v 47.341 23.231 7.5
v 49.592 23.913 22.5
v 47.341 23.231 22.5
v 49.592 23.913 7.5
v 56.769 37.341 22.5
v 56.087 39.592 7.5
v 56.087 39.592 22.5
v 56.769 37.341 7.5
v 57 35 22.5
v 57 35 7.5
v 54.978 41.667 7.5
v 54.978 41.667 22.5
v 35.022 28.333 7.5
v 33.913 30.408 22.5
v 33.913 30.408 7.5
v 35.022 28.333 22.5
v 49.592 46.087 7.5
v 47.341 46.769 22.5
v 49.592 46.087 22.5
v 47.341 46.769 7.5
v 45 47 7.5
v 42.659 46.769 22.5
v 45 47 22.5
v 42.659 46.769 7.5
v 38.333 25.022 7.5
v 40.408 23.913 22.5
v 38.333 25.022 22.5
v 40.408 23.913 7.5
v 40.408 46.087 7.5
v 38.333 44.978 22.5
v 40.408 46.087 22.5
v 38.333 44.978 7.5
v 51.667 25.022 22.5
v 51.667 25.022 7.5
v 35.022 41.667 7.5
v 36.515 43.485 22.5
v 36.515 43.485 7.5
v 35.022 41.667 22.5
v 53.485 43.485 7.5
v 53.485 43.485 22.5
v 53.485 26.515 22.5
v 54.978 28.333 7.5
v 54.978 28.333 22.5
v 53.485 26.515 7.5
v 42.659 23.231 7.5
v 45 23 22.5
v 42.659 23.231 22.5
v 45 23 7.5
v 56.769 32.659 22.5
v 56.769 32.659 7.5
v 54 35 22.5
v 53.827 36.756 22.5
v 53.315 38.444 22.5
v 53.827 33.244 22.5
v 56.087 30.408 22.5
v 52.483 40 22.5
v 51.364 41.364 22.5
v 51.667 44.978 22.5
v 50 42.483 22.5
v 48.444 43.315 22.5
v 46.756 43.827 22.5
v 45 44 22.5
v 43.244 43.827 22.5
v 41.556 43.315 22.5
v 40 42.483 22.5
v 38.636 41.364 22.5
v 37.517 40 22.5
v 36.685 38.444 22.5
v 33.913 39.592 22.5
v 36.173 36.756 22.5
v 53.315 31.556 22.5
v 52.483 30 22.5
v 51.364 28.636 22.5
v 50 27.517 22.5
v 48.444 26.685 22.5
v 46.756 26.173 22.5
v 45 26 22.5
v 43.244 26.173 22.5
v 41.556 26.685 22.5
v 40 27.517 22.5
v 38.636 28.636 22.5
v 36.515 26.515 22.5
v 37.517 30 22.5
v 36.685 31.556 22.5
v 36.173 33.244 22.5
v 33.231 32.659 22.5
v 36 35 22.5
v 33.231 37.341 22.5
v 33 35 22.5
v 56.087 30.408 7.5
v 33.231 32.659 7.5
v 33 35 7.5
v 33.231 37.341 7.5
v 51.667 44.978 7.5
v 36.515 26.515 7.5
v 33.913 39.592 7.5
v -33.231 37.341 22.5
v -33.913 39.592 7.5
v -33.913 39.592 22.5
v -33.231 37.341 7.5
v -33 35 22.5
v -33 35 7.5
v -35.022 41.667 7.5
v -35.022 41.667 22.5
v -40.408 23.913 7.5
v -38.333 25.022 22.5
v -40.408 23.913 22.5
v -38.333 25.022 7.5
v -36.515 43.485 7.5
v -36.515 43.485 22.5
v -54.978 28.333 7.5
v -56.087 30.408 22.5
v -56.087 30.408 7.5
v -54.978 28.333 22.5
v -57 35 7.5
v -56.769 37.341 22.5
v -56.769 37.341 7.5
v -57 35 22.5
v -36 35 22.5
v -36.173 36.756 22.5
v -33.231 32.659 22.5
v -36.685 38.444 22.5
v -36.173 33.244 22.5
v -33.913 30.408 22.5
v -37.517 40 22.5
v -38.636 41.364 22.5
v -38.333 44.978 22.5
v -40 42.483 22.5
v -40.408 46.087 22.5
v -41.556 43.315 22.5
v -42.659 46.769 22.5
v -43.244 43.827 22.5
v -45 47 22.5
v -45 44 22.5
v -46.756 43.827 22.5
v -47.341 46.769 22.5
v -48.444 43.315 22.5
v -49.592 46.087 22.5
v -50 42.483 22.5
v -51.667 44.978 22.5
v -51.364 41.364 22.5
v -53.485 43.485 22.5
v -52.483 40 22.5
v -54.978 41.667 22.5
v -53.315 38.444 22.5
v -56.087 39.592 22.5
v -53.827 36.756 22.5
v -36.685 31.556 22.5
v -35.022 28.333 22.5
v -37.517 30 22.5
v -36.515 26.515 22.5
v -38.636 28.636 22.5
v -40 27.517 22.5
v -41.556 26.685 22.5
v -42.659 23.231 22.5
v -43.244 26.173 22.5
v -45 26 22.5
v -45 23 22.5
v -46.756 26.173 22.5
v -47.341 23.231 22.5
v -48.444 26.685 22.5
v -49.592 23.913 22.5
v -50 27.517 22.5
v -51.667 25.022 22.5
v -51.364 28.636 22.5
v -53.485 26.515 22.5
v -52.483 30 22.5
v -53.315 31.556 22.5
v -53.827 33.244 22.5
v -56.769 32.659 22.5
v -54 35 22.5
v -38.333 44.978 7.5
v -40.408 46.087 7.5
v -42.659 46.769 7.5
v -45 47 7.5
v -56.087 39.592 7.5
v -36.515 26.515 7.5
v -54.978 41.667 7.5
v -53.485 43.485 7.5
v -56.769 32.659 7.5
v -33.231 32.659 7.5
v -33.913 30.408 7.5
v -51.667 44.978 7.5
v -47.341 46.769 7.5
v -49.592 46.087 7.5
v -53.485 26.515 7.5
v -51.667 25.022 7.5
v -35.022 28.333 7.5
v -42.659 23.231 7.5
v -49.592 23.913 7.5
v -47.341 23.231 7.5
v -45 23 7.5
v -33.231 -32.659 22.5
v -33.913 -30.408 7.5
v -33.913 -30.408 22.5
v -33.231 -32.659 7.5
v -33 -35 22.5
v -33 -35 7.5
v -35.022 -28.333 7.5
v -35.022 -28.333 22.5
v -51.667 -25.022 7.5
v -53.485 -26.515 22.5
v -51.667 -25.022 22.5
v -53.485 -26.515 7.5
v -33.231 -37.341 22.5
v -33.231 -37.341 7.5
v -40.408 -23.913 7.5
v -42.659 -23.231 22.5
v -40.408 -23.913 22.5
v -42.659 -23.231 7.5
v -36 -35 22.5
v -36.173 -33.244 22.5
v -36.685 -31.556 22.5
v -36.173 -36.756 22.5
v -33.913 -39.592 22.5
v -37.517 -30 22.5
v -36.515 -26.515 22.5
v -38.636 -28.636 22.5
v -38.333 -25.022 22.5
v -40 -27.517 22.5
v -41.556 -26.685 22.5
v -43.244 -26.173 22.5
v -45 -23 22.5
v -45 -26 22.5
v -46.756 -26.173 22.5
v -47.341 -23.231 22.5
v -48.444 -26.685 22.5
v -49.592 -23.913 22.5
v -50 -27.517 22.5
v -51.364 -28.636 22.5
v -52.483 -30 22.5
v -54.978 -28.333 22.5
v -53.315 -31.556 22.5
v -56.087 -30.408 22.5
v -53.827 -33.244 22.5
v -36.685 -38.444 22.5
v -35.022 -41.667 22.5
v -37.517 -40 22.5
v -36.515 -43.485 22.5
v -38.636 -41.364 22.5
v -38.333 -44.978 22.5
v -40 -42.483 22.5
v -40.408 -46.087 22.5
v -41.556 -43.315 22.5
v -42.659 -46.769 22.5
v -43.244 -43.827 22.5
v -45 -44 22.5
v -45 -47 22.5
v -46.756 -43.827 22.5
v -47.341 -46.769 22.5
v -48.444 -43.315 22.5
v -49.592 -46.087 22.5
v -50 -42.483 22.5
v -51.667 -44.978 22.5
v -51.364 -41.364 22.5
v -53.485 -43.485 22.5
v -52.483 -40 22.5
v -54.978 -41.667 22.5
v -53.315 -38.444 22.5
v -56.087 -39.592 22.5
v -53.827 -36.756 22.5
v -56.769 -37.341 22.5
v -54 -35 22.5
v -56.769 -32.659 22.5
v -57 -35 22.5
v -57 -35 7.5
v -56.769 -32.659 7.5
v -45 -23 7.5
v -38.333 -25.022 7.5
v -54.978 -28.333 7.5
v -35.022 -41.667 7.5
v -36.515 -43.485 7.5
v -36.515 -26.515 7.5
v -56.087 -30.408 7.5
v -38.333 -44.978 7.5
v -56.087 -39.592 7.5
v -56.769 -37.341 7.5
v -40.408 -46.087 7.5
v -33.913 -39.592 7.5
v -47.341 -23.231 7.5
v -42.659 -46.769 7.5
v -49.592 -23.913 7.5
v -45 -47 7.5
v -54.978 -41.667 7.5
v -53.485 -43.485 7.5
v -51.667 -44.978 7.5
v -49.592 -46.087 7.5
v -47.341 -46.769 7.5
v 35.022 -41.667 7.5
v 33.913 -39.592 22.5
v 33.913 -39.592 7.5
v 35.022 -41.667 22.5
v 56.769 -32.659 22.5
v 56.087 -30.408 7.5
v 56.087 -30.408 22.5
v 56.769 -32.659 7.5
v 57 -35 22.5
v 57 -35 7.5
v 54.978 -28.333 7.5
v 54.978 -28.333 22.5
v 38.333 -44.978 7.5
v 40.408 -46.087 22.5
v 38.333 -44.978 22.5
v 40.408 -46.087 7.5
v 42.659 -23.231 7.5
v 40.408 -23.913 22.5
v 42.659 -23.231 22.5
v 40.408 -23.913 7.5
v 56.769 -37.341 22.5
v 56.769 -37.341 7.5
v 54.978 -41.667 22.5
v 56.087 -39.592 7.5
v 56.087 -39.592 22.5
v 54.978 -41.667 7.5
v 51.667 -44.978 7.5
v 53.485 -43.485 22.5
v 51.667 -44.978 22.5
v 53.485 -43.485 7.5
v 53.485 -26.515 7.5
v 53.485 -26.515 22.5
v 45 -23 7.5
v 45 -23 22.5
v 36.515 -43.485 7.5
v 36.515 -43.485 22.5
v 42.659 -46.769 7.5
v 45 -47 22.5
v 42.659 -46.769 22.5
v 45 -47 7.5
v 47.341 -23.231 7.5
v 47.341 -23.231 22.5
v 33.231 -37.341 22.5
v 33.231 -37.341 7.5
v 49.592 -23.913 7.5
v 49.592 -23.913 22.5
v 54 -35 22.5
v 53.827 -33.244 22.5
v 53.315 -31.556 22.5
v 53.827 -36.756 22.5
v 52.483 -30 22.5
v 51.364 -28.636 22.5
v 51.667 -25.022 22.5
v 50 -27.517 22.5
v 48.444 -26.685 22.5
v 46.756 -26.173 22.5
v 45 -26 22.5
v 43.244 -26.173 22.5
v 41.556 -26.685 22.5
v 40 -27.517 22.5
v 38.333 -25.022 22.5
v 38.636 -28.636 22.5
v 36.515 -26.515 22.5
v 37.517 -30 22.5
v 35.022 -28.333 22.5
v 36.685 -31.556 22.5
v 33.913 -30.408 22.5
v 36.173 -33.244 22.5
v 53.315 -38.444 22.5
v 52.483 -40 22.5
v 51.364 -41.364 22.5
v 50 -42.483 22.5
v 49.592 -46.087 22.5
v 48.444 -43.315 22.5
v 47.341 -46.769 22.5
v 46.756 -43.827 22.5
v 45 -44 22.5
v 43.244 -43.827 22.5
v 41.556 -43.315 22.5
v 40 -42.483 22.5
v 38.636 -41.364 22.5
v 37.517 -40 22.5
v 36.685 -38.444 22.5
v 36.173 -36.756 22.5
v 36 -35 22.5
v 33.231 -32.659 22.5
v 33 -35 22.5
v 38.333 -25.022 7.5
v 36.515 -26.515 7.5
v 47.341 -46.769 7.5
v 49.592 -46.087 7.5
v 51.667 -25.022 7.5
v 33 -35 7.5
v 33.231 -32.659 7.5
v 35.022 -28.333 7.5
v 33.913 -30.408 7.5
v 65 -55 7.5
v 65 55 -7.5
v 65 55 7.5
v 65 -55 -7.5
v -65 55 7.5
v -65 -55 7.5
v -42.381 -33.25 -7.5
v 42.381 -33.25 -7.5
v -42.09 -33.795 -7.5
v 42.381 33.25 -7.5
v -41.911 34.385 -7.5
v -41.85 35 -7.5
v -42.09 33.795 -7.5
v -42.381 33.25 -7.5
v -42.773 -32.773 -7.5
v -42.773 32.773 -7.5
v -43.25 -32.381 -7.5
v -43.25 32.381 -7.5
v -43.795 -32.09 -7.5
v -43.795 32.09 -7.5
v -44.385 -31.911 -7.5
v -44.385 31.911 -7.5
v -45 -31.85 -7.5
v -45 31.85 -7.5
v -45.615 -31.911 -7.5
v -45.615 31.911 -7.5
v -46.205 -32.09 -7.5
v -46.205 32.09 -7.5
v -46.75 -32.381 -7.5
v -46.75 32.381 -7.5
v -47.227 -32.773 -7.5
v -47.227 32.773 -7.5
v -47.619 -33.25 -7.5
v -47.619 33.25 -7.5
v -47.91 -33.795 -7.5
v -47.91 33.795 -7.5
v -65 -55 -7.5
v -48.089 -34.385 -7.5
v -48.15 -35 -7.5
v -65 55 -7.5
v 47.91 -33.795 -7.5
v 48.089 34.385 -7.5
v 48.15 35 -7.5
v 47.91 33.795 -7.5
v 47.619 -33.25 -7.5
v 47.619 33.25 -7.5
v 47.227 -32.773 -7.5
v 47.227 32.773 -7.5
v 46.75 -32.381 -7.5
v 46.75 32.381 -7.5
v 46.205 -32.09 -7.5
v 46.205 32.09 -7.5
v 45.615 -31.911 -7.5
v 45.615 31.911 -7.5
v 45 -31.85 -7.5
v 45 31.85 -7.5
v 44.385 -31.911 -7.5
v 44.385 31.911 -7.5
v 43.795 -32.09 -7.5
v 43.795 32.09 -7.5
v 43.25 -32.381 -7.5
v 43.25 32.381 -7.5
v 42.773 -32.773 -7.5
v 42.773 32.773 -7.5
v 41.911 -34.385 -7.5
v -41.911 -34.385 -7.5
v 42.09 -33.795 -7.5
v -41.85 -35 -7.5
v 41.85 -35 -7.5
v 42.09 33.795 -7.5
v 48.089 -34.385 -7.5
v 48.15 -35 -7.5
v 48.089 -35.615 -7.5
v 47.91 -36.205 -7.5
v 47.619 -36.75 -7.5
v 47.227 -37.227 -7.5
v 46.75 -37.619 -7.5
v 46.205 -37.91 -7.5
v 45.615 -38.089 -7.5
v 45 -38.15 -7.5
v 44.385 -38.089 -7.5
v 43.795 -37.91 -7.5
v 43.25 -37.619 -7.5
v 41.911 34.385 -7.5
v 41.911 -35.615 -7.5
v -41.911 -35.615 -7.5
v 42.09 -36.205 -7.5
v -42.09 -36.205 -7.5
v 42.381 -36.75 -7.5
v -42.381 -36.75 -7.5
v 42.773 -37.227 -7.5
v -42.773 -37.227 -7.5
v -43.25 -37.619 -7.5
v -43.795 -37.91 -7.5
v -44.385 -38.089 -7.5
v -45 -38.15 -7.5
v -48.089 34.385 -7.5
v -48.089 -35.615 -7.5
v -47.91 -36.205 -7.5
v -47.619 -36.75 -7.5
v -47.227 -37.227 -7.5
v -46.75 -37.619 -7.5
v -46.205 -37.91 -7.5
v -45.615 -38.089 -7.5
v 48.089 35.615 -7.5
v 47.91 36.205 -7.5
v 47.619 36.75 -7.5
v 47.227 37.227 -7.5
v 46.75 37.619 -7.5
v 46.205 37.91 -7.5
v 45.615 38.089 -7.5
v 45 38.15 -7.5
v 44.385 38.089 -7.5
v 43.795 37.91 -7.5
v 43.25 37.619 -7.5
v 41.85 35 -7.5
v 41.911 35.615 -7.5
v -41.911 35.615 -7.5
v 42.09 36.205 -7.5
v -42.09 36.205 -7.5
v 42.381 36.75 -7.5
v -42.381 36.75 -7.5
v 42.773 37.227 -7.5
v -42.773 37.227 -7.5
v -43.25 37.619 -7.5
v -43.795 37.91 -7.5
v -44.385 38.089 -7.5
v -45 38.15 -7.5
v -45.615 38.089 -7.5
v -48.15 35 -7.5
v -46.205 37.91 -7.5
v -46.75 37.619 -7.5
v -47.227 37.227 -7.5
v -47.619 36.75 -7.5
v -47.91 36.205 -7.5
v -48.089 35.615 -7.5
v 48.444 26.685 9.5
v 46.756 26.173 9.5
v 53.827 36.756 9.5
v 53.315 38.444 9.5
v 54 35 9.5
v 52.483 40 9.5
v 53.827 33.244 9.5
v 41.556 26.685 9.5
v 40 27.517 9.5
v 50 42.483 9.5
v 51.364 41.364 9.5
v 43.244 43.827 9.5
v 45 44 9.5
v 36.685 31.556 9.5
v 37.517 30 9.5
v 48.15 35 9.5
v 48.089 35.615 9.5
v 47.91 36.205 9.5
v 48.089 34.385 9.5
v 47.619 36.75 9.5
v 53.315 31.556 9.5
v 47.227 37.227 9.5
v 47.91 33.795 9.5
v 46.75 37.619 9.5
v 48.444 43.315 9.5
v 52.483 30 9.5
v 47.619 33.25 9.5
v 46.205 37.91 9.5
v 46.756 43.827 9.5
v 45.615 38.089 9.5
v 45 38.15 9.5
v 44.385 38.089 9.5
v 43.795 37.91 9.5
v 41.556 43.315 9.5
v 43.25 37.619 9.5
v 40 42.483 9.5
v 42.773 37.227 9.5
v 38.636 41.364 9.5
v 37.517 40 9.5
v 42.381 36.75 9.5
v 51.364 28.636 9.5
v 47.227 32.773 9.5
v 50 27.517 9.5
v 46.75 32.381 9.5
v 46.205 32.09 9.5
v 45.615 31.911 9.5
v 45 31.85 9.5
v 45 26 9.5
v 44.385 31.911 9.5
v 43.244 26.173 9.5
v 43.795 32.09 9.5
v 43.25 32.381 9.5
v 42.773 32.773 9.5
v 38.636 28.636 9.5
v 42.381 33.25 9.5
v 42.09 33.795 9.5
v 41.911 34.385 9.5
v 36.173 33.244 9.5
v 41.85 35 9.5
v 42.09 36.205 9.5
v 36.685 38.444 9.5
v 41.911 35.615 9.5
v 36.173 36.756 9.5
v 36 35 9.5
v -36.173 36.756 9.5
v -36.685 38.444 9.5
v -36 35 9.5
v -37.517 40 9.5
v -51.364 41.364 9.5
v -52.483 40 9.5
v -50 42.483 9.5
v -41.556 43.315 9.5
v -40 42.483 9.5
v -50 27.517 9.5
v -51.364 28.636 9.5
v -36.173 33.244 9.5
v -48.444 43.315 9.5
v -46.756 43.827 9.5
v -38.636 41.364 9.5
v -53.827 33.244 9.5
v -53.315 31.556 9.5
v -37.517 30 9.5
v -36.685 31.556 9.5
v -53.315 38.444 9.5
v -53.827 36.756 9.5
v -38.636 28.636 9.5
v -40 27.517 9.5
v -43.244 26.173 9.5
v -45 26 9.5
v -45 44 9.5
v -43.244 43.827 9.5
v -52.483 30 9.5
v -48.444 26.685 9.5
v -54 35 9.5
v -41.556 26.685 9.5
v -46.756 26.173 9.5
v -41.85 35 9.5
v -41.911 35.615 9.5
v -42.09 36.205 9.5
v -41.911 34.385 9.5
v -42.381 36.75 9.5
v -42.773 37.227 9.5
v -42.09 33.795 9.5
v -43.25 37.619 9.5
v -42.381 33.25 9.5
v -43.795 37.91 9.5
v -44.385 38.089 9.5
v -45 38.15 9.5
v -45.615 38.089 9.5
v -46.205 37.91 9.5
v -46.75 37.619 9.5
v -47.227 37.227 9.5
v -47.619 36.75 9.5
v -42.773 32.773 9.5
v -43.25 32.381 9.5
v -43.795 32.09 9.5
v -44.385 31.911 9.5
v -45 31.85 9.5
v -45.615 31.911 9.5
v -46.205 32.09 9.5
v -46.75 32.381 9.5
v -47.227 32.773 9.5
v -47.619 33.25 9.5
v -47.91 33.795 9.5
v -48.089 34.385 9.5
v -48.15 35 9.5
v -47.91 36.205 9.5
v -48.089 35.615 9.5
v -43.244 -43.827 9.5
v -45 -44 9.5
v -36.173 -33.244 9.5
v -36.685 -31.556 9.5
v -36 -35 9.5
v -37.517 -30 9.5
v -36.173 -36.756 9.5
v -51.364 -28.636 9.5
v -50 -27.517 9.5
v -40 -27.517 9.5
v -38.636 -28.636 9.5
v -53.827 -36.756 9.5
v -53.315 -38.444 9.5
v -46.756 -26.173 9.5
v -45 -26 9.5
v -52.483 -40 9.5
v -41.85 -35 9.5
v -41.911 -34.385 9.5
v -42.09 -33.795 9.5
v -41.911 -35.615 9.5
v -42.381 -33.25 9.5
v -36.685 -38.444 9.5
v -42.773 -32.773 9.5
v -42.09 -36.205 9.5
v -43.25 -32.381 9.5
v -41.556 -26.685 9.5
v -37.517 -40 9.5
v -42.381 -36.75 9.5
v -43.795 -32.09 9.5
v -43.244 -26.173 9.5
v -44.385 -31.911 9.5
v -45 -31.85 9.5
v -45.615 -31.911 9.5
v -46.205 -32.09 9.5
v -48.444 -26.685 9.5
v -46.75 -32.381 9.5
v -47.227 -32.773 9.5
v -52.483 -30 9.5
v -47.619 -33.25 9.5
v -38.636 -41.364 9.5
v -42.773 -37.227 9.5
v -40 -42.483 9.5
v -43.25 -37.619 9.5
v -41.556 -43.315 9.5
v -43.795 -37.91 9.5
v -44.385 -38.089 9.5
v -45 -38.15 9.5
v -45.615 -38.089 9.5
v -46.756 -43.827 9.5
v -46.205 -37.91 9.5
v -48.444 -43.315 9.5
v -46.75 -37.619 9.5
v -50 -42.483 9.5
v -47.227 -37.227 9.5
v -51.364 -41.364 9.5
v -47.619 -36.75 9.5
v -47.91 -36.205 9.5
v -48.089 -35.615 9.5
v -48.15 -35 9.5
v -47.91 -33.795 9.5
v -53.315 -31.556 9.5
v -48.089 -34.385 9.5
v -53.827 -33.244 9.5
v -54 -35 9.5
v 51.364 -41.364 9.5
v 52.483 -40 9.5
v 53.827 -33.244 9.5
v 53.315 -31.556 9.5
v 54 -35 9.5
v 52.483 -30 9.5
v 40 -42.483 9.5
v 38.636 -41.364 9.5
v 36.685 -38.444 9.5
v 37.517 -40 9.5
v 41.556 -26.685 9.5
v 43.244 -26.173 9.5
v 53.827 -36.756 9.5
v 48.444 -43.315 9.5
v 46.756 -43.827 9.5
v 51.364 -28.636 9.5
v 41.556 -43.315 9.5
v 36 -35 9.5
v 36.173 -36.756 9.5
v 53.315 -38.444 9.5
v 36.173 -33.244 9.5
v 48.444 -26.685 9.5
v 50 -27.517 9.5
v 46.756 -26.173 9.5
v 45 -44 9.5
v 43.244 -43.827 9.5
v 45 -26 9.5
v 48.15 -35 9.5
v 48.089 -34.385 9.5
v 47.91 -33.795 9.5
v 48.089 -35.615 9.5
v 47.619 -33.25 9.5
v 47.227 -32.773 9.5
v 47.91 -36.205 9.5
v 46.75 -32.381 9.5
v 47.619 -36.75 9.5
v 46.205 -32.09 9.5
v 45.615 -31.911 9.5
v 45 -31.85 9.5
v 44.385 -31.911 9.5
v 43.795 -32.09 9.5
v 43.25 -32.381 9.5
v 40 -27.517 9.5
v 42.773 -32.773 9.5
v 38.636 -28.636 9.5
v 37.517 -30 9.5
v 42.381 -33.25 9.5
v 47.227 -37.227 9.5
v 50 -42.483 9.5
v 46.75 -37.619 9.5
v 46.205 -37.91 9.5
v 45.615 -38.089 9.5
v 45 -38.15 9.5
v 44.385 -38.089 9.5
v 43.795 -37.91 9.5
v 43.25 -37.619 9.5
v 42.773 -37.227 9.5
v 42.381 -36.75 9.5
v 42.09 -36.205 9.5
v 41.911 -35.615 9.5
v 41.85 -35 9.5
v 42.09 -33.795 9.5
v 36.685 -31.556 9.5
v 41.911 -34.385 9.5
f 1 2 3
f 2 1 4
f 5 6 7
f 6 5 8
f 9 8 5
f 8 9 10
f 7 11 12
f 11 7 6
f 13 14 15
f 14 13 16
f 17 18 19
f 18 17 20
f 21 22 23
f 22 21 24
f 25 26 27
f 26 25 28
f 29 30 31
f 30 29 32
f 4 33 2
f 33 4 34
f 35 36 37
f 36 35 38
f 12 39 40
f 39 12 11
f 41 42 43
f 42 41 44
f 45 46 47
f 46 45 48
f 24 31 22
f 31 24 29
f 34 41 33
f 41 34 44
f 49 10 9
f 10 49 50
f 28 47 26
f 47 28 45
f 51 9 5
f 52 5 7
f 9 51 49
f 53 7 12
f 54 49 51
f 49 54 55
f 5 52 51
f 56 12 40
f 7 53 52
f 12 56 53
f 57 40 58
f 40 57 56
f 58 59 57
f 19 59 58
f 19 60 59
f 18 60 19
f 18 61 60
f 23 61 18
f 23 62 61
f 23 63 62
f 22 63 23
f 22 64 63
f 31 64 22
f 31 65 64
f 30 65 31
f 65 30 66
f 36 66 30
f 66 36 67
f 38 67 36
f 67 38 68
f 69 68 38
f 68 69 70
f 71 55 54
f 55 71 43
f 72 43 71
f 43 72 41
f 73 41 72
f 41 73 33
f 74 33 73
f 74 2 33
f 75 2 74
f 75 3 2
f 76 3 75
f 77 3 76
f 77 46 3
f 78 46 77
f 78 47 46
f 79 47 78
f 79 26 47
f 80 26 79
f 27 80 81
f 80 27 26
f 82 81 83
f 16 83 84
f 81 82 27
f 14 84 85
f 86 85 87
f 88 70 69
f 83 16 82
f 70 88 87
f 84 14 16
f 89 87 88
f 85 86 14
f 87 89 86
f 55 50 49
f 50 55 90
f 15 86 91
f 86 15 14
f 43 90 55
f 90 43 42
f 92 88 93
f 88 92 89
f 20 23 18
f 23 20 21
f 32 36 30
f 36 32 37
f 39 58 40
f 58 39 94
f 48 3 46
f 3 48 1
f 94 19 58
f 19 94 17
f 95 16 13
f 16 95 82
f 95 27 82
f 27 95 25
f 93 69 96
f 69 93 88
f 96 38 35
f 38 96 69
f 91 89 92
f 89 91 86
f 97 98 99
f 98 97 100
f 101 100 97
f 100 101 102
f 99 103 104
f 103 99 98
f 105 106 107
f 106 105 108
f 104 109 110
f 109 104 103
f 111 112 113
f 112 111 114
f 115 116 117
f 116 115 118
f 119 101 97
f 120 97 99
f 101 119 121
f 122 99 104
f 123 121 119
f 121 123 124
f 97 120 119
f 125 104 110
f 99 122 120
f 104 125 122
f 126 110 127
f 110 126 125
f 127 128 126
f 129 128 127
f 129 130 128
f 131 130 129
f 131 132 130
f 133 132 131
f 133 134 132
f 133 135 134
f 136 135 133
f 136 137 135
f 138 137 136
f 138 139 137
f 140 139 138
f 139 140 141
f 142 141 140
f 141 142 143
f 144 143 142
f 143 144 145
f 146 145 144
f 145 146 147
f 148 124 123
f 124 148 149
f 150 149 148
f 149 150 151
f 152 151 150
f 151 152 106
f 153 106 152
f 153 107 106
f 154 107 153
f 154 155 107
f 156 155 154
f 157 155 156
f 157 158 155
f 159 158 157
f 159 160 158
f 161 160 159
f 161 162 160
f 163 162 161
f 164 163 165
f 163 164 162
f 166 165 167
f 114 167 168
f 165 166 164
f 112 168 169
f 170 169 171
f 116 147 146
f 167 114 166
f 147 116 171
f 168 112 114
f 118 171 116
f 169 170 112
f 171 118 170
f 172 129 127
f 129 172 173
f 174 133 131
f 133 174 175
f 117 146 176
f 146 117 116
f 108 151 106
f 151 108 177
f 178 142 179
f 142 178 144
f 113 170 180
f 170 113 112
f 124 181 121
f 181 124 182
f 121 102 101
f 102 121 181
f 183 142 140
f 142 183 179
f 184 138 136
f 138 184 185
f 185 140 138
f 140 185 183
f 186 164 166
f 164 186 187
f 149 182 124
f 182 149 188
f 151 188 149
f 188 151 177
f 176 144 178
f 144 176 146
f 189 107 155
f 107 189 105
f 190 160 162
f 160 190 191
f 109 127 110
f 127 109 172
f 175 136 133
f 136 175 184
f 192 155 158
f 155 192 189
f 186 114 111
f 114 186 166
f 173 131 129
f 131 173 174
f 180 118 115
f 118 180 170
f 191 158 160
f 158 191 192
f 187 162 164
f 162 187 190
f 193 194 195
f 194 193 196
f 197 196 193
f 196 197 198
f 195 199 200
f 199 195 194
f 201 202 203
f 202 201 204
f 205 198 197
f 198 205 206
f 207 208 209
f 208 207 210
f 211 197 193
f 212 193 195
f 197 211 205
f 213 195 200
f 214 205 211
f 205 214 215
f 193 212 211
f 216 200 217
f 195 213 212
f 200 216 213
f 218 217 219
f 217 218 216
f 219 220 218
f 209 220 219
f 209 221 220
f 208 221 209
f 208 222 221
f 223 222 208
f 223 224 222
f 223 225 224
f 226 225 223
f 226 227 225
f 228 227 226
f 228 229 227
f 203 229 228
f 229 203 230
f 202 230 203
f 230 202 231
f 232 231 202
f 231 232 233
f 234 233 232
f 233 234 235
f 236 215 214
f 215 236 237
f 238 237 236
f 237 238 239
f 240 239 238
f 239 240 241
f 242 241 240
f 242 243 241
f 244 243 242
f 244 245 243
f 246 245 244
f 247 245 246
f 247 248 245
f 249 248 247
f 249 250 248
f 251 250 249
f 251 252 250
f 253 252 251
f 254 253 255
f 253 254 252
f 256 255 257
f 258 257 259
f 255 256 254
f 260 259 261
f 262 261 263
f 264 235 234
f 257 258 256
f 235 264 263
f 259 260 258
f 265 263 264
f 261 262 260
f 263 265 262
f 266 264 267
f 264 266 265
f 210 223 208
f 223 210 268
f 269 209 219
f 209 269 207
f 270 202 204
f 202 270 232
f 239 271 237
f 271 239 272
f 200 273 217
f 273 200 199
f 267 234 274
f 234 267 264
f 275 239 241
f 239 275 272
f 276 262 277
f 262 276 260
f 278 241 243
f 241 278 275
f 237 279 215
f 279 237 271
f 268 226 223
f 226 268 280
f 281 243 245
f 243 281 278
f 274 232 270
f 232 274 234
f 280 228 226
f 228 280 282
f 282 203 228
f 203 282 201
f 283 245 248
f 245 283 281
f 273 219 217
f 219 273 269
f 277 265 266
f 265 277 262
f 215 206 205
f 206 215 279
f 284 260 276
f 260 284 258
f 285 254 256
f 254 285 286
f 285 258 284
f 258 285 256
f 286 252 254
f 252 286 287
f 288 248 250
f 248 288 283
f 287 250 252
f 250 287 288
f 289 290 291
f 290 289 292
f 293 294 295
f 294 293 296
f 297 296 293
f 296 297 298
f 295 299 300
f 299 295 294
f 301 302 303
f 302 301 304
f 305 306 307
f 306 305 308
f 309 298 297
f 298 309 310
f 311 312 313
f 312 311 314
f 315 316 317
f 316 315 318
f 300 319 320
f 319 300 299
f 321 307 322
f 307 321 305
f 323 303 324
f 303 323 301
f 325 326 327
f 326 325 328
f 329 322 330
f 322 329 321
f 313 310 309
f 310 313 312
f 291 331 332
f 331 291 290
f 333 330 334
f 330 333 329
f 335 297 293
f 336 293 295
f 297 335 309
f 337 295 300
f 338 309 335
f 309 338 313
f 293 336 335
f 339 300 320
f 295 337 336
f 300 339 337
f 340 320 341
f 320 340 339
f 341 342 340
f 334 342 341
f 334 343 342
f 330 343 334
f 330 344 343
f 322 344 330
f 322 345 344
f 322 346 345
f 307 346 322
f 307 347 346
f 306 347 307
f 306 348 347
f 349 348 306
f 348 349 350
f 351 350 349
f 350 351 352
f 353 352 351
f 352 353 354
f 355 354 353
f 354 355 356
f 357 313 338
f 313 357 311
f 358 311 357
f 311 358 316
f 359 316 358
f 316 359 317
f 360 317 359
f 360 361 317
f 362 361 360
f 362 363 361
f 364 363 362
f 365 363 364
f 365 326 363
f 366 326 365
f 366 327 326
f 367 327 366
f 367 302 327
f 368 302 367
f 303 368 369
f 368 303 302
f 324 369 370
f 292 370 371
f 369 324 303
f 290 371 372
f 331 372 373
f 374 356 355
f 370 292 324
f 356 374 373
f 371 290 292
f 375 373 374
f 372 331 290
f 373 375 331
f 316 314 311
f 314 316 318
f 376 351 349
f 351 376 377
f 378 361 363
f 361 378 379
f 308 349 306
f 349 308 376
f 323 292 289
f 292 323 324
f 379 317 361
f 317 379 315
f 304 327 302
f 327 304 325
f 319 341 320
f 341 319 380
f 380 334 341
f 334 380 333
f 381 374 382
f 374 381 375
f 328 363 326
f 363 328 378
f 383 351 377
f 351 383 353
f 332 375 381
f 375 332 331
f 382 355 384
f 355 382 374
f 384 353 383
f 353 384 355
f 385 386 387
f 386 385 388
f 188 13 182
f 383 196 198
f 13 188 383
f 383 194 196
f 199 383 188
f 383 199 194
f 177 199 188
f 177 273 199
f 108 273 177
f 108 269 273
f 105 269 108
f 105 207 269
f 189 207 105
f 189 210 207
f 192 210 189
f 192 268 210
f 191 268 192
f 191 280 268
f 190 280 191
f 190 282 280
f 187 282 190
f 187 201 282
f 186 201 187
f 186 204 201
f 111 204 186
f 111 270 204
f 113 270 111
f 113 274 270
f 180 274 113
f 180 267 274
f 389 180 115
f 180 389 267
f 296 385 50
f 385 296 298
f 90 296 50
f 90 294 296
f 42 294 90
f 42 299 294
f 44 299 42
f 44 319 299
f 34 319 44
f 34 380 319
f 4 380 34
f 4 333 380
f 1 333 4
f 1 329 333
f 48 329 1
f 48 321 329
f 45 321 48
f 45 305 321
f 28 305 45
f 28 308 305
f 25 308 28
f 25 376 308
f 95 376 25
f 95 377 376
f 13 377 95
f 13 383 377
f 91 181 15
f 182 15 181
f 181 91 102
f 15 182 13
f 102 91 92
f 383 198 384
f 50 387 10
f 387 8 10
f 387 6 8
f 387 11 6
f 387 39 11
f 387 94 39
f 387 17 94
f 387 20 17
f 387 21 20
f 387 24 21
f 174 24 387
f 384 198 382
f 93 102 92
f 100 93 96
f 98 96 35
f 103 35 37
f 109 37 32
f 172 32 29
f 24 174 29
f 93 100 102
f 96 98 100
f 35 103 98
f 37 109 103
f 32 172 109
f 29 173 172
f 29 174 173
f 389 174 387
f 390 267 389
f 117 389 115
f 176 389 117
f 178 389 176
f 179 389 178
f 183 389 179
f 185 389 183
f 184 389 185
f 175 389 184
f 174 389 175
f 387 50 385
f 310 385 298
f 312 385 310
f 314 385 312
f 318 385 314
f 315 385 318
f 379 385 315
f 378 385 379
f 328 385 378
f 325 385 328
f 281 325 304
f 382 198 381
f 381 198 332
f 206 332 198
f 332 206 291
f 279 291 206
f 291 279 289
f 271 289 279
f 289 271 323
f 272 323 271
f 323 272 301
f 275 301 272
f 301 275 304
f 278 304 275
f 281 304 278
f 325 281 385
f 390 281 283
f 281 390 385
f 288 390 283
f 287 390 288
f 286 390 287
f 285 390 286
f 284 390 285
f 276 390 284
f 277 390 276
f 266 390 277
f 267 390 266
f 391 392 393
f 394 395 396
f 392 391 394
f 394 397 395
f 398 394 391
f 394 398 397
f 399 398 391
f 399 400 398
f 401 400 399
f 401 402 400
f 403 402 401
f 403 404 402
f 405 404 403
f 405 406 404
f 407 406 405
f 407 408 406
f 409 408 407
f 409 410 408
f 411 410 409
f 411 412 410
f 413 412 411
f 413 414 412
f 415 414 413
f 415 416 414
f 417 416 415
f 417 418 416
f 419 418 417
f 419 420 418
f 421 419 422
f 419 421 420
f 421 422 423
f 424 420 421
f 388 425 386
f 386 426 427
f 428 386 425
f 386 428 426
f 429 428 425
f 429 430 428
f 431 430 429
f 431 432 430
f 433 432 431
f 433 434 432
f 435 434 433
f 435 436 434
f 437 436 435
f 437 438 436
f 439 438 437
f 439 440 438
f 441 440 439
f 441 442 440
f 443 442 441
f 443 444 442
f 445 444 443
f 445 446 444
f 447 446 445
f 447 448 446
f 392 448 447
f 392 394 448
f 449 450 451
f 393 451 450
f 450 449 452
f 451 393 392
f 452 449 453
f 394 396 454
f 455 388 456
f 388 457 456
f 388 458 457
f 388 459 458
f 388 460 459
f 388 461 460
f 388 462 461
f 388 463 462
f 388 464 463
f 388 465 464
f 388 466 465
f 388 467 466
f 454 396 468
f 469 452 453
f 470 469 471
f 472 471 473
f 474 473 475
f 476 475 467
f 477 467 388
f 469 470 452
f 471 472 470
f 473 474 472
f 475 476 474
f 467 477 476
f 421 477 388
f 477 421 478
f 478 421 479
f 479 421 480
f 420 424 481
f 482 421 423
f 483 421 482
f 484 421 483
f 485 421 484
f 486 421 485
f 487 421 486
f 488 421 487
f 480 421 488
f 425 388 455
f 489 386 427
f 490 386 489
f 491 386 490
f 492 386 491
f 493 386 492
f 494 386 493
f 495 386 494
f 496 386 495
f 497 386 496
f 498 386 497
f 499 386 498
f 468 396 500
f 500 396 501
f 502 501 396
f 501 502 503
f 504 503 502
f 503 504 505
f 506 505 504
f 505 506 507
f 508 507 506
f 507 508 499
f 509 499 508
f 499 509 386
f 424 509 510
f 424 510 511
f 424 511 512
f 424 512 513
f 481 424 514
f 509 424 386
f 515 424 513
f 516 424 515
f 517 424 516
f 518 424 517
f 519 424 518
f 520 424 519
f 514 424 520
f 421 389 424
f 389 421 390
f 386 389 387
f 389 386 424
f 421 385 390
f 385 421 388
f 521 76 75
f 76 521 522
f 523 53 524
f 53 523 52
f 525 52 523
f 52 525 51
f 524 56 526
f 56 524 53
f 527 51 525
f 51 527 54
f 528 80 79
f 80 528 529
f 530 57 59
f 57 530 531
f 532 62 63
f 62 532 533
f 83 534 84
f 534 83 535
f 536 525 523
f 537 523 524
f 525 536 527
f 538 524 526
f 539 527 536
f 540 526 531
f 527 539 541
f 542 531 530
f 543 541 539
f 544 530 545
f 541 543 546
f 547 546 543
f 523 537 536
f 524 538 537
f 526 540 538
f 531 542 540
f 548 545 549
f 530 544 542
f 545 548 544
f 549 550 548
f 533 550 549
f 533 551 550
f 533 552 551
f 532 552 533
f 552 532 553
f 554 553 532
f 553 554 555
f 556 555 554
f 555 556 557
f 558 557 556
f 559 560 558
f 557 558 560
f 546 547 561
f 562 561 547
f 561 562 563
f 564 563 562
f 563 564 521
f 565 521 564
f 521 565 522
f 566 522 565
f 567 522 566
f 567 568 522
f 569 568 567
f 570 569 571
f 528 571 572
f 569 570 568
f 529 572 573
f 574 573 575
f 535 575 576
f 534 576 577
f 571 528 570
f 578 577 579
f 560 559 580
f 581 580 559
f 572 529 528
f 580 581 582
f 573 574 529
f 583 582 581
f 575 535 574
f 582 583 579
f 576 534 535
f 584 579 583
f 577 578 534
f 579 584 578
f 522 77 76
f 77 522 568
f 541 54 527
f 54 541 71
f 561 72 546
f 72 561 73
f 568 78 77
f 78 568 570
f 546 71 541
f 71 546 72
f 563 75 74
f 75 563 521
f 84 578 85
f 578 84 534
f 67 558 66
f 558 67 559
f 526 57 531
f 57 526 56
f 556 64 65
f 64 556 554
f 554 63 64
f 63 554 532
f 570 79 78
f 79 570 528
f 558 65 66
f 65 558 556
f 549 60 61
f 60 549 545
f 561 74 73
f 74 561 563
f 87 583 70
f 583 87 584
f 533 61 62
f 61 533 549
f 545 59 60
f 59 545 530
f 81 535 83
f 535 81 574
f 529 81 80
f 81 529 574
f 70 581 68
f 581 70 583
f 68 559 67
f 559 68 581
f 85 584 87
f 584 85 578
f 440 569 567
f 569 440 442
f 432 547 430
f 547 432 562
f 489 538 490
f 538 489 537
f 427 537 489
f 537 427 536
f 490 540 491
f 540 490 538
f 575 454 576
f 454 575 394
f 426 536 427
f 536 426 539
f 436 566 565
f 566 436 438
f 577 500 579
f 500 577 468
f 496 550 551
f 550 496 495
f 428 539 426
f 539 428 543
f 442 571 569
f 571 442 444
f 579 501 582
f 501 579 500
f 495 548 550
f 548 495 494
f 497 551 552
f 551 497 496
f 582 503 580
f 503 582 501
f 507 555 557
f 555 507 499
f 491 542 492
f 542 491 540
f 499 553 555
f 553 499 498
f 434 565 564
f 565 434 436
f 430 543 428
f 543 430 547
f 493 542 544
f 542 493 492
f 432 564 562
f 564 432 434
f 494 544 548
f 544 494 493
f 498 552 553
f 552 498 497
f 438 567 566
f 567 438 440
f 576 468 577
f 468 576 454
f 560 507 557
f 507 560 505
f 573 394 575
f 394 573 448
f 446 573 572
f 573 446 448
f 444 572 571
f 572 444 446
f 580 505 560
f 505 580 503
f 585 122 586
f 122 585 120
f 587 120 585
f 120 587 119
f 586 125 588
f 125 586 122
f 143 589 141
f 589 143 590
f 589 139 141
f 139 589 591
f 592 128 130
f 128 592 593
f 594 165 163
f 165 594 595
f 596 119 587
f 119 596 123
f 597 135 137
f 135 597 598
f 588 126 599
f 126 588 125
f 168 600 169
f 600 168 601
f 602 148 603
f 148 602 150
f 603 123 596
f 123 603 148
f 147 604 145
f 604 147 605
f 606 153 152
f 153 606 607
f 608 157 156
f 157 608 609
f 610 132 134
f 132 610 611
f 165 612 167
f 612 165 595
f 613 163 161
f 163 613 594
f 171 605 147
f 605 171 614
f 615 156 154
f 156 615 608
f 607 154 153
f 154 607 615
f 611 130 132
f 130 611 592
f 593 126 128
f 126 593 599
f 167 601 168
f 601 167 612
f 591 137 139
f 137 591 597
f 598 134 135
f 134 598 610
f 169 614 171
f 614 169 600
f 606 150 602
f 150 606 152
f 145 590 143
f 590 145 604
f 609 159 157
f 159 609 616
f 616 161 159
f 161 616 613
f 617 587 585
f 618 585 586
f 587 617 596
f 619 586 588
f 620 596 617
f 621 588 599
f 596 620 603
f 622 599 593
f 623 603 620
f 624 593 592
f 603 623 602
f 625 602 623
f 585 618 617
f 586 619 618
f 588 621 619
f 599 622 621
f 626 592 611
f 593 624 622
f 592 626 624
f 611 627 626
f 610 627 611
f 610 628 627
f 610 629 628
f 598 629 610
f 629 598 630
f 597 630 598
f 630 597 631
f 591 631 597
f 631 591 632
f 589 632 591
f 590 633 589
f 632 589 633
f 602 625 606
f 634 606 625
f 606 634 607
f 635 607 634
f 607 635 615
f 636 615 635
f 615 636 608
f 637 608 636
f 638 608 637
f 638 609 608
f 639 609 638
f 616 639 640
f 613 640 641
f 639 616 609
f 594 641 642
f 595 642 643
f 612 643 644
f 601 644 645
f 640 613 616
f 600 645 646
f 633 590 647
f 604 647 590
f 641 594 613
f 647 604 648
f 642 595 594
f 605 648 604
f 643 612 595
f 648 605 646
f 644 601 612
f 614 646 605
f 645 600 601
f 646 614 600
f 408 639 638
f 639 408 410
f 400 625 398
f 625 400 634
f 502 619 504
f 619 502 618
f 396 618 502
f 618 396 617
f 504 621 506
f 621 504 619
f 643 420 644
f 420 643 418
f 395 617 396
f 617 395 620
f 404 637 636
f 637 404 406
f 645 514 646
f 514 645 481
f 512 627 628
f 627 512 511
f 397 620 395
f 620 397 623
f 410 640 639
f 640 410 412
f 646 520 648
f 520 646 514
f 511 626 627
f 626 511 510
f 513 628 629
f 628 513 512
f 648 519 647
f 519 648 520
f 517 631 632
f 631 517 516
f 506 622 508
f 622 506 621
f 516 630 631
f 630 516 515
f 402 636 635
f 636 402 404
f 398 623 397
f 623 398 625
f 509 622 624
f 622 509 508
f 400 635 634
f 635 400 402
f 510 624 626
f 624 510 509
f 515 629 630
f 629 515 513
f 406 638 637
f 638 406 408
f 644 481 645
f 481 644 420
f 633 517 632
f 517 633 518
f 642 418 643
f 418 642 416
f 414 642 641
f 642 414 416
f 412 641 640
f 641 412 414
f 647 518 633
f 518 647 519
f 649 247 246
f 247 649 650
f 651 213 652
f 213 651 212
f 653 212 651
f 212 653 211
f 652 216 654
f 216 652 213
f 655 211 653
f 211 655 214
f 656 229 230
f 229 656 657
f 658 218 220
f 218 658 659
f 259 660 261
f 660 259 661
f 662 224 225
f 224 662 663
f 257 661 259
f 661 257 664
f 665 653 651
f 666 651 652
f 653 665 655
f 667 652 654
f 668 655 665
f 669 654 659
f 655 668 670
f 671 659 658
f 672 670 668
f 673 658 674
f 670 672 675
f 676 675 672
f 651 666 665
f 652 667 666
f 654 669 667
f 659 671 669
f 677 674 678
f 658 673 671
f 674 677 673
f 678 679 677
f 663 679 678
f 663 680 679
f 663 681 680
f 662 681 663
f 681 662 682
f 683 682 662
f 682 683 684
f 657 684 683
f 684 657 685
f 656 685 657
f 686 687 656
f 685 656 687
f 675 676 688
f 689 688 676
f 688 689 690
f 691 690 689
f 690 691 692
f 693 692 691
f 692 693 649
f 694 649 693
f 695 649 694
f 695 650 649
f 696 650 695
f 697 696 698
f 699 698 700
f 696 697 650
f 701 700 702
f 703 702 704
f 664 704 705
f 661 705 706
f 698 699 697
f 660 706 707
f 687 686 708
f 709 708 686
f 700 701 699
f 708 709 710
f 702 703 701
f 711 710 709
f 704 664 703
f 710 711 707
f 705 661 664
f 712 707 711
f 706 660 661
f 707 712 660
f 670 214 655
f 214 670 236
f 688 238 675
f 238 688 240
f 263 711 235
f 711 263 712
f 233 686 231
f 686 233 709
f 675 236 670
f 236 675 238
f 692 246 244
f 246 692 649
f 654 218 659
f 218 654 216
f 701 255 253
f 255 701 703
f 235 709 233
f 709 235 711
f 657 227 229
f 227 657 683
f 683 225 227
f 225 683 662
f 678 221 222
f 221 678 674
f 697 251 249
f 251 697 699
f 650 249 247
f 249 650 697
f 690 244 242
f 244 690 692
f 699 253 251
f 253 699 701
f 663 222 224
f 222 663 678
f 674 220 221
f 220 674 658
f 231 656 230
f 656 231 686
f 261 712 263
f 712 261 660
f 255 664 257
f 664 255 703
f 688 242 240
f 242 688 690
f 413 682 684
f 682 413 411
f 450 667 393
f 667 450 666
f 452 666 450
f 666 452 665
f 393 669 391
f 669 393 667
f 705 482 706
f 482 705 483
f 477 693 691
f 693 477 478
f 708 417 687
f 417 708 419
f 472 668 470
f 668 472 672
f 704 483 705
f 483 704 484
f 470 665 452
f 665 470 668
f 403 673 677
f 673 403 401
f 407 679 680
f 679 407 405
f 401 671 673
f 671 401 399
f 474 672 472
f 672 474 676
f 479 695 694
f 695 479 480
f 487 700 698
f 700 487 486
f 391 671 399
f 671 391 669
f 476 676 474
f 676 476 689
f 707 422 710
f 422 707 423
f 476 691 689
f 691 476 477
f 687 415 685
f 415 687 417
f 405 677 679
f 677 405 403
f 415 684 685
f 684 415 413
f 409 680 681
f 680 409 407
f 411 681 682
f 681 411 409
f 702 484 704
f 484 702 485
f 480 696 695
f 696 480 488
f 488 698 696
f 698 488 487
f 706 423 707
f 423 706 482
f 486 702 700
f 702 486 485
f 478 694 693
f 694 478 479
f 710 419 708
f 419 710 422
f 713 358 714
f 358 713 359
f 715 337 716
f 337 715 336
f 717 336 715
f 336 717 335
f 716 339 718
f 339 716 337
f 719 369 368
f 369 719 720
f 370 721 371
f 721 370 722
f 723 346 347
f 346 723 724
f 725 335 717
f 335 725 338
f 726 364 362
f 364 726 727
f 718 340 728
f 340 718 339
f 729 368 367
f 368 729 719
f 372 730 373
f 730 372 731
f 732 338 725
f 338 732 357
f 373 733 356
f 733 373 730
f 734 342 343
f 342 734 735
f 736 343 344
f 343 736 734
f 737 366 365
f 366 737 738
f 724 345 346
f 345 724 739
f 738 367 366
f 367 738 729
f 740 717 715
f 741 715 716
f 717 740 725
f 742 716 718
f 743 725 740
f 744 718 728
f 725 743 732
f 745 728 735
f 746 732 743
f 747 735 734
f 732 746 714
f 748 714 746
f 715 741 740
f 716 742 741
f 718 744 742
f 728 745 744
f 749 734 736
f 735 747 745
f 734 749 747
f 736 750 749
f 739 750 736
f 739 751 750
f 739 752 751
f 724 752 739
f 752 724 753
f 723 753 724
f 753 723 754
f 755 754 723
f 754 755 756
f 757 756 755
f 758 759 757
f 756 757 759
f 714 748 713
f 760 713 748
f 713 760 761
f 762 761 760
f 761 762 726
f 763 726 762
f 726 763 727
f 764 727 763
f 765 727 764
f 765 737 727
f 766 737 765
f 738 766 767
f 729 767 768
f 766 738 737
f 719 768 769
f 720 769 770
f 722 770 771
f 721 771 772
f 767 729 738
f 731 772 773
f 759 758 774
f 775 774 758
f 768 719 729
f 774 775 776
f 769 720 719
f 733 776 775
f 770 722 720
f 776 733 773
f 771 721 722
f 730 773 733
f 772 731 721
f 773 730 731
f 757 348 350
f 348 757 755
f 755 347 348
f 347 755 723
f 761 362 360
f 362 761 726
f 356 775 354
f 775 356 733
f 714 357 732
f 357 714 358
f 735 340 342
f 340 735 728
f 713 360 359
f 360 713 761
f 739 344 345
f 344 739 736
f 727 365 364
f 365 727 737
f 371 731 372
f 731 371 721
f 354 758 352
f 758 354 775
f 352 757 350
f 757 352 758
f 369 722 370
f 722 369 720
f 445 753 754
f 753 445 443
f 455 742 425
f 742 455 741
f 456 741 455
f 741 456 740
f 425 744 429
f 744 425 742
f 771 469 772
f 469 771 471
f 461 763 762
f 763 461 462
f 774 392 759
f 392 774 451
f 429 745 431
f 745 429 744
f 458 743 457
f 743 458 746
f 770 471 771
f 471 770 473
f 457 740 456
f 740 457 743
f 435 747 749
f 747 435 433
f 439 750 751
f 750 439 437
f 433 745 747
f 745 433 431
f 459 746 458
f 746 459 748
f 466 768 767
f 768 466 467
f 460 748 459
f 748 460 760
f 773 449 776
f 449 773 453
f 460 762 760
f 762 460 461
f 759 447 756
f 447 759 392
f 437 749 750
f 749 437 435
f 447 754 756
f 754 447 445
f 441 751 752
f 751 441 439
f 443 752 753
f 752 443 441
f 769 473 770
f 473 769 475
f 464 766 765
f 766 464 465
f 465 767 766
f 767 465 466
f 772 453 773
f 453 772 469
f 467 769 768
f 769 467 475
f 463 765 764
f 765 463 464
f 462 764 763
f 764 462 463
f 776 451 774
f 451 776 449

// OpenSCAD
$fn = 32;

// ----------------------------------------------------------------------
// Socket pad plate
// bosses with counterbored sockets for the screws
// ----------------------------------------------------------------------

// --- parameters (mm) ---
base_t = 15;             // base plate thickness
boss_h = 15;             // boss height above the base plate
boss_d = 24;             // boss diameter
socket_d = 18;           // socket diameter
socket_depth = 13;       // socket depth from the boss face
bolt_d = 6.3;            // screw clearance hole through the socket floor
plate = [130, 110, 15];  // overall size (x, y, z)
edge = 20;               // boss centre offset from the plate edge
pads = 4;                // boss count, one per corner

// --- derived feature positions (mm) ---
height = base_t + boss_h;        // = 30   overall height of the part
corner_x = plate[0] / 2 - edge;  // = 45   boss centre X
corner_y = plate[1] / 2 - edge;  // = 35   boss centre Y
feature_centers = [
  [corner_x, corner_y],
  [-corner_x, corner_y],
  [-corner_x, -corner_y],
  [corner_x, -corner_y]
];   // boss centres: sockets, holes and the pads themselves are placed from here

// base plate, bosses on feature_centers, socket + through hole in each
difference() {
  union() {
    cube(plate, center = true);
    for (centre = feature_centers)
      translate([centre[0], centre[1], plate[2] / 2 - 1])
        cylinder(d = boss_d, h = boss_h + 1);
  }
  for (centre = feature_centers) {
    translate([centre[0], centre[1], plate[2] / 2 + boss_h - socket_depth])
      cylinder(d = socket_d, h = socket_depth + 1);
    translate([centre[0], centre[1], -height])
      cylinder(d = bolt_d, h = 2 * height + 2);  // through the socket floor
  }
}
